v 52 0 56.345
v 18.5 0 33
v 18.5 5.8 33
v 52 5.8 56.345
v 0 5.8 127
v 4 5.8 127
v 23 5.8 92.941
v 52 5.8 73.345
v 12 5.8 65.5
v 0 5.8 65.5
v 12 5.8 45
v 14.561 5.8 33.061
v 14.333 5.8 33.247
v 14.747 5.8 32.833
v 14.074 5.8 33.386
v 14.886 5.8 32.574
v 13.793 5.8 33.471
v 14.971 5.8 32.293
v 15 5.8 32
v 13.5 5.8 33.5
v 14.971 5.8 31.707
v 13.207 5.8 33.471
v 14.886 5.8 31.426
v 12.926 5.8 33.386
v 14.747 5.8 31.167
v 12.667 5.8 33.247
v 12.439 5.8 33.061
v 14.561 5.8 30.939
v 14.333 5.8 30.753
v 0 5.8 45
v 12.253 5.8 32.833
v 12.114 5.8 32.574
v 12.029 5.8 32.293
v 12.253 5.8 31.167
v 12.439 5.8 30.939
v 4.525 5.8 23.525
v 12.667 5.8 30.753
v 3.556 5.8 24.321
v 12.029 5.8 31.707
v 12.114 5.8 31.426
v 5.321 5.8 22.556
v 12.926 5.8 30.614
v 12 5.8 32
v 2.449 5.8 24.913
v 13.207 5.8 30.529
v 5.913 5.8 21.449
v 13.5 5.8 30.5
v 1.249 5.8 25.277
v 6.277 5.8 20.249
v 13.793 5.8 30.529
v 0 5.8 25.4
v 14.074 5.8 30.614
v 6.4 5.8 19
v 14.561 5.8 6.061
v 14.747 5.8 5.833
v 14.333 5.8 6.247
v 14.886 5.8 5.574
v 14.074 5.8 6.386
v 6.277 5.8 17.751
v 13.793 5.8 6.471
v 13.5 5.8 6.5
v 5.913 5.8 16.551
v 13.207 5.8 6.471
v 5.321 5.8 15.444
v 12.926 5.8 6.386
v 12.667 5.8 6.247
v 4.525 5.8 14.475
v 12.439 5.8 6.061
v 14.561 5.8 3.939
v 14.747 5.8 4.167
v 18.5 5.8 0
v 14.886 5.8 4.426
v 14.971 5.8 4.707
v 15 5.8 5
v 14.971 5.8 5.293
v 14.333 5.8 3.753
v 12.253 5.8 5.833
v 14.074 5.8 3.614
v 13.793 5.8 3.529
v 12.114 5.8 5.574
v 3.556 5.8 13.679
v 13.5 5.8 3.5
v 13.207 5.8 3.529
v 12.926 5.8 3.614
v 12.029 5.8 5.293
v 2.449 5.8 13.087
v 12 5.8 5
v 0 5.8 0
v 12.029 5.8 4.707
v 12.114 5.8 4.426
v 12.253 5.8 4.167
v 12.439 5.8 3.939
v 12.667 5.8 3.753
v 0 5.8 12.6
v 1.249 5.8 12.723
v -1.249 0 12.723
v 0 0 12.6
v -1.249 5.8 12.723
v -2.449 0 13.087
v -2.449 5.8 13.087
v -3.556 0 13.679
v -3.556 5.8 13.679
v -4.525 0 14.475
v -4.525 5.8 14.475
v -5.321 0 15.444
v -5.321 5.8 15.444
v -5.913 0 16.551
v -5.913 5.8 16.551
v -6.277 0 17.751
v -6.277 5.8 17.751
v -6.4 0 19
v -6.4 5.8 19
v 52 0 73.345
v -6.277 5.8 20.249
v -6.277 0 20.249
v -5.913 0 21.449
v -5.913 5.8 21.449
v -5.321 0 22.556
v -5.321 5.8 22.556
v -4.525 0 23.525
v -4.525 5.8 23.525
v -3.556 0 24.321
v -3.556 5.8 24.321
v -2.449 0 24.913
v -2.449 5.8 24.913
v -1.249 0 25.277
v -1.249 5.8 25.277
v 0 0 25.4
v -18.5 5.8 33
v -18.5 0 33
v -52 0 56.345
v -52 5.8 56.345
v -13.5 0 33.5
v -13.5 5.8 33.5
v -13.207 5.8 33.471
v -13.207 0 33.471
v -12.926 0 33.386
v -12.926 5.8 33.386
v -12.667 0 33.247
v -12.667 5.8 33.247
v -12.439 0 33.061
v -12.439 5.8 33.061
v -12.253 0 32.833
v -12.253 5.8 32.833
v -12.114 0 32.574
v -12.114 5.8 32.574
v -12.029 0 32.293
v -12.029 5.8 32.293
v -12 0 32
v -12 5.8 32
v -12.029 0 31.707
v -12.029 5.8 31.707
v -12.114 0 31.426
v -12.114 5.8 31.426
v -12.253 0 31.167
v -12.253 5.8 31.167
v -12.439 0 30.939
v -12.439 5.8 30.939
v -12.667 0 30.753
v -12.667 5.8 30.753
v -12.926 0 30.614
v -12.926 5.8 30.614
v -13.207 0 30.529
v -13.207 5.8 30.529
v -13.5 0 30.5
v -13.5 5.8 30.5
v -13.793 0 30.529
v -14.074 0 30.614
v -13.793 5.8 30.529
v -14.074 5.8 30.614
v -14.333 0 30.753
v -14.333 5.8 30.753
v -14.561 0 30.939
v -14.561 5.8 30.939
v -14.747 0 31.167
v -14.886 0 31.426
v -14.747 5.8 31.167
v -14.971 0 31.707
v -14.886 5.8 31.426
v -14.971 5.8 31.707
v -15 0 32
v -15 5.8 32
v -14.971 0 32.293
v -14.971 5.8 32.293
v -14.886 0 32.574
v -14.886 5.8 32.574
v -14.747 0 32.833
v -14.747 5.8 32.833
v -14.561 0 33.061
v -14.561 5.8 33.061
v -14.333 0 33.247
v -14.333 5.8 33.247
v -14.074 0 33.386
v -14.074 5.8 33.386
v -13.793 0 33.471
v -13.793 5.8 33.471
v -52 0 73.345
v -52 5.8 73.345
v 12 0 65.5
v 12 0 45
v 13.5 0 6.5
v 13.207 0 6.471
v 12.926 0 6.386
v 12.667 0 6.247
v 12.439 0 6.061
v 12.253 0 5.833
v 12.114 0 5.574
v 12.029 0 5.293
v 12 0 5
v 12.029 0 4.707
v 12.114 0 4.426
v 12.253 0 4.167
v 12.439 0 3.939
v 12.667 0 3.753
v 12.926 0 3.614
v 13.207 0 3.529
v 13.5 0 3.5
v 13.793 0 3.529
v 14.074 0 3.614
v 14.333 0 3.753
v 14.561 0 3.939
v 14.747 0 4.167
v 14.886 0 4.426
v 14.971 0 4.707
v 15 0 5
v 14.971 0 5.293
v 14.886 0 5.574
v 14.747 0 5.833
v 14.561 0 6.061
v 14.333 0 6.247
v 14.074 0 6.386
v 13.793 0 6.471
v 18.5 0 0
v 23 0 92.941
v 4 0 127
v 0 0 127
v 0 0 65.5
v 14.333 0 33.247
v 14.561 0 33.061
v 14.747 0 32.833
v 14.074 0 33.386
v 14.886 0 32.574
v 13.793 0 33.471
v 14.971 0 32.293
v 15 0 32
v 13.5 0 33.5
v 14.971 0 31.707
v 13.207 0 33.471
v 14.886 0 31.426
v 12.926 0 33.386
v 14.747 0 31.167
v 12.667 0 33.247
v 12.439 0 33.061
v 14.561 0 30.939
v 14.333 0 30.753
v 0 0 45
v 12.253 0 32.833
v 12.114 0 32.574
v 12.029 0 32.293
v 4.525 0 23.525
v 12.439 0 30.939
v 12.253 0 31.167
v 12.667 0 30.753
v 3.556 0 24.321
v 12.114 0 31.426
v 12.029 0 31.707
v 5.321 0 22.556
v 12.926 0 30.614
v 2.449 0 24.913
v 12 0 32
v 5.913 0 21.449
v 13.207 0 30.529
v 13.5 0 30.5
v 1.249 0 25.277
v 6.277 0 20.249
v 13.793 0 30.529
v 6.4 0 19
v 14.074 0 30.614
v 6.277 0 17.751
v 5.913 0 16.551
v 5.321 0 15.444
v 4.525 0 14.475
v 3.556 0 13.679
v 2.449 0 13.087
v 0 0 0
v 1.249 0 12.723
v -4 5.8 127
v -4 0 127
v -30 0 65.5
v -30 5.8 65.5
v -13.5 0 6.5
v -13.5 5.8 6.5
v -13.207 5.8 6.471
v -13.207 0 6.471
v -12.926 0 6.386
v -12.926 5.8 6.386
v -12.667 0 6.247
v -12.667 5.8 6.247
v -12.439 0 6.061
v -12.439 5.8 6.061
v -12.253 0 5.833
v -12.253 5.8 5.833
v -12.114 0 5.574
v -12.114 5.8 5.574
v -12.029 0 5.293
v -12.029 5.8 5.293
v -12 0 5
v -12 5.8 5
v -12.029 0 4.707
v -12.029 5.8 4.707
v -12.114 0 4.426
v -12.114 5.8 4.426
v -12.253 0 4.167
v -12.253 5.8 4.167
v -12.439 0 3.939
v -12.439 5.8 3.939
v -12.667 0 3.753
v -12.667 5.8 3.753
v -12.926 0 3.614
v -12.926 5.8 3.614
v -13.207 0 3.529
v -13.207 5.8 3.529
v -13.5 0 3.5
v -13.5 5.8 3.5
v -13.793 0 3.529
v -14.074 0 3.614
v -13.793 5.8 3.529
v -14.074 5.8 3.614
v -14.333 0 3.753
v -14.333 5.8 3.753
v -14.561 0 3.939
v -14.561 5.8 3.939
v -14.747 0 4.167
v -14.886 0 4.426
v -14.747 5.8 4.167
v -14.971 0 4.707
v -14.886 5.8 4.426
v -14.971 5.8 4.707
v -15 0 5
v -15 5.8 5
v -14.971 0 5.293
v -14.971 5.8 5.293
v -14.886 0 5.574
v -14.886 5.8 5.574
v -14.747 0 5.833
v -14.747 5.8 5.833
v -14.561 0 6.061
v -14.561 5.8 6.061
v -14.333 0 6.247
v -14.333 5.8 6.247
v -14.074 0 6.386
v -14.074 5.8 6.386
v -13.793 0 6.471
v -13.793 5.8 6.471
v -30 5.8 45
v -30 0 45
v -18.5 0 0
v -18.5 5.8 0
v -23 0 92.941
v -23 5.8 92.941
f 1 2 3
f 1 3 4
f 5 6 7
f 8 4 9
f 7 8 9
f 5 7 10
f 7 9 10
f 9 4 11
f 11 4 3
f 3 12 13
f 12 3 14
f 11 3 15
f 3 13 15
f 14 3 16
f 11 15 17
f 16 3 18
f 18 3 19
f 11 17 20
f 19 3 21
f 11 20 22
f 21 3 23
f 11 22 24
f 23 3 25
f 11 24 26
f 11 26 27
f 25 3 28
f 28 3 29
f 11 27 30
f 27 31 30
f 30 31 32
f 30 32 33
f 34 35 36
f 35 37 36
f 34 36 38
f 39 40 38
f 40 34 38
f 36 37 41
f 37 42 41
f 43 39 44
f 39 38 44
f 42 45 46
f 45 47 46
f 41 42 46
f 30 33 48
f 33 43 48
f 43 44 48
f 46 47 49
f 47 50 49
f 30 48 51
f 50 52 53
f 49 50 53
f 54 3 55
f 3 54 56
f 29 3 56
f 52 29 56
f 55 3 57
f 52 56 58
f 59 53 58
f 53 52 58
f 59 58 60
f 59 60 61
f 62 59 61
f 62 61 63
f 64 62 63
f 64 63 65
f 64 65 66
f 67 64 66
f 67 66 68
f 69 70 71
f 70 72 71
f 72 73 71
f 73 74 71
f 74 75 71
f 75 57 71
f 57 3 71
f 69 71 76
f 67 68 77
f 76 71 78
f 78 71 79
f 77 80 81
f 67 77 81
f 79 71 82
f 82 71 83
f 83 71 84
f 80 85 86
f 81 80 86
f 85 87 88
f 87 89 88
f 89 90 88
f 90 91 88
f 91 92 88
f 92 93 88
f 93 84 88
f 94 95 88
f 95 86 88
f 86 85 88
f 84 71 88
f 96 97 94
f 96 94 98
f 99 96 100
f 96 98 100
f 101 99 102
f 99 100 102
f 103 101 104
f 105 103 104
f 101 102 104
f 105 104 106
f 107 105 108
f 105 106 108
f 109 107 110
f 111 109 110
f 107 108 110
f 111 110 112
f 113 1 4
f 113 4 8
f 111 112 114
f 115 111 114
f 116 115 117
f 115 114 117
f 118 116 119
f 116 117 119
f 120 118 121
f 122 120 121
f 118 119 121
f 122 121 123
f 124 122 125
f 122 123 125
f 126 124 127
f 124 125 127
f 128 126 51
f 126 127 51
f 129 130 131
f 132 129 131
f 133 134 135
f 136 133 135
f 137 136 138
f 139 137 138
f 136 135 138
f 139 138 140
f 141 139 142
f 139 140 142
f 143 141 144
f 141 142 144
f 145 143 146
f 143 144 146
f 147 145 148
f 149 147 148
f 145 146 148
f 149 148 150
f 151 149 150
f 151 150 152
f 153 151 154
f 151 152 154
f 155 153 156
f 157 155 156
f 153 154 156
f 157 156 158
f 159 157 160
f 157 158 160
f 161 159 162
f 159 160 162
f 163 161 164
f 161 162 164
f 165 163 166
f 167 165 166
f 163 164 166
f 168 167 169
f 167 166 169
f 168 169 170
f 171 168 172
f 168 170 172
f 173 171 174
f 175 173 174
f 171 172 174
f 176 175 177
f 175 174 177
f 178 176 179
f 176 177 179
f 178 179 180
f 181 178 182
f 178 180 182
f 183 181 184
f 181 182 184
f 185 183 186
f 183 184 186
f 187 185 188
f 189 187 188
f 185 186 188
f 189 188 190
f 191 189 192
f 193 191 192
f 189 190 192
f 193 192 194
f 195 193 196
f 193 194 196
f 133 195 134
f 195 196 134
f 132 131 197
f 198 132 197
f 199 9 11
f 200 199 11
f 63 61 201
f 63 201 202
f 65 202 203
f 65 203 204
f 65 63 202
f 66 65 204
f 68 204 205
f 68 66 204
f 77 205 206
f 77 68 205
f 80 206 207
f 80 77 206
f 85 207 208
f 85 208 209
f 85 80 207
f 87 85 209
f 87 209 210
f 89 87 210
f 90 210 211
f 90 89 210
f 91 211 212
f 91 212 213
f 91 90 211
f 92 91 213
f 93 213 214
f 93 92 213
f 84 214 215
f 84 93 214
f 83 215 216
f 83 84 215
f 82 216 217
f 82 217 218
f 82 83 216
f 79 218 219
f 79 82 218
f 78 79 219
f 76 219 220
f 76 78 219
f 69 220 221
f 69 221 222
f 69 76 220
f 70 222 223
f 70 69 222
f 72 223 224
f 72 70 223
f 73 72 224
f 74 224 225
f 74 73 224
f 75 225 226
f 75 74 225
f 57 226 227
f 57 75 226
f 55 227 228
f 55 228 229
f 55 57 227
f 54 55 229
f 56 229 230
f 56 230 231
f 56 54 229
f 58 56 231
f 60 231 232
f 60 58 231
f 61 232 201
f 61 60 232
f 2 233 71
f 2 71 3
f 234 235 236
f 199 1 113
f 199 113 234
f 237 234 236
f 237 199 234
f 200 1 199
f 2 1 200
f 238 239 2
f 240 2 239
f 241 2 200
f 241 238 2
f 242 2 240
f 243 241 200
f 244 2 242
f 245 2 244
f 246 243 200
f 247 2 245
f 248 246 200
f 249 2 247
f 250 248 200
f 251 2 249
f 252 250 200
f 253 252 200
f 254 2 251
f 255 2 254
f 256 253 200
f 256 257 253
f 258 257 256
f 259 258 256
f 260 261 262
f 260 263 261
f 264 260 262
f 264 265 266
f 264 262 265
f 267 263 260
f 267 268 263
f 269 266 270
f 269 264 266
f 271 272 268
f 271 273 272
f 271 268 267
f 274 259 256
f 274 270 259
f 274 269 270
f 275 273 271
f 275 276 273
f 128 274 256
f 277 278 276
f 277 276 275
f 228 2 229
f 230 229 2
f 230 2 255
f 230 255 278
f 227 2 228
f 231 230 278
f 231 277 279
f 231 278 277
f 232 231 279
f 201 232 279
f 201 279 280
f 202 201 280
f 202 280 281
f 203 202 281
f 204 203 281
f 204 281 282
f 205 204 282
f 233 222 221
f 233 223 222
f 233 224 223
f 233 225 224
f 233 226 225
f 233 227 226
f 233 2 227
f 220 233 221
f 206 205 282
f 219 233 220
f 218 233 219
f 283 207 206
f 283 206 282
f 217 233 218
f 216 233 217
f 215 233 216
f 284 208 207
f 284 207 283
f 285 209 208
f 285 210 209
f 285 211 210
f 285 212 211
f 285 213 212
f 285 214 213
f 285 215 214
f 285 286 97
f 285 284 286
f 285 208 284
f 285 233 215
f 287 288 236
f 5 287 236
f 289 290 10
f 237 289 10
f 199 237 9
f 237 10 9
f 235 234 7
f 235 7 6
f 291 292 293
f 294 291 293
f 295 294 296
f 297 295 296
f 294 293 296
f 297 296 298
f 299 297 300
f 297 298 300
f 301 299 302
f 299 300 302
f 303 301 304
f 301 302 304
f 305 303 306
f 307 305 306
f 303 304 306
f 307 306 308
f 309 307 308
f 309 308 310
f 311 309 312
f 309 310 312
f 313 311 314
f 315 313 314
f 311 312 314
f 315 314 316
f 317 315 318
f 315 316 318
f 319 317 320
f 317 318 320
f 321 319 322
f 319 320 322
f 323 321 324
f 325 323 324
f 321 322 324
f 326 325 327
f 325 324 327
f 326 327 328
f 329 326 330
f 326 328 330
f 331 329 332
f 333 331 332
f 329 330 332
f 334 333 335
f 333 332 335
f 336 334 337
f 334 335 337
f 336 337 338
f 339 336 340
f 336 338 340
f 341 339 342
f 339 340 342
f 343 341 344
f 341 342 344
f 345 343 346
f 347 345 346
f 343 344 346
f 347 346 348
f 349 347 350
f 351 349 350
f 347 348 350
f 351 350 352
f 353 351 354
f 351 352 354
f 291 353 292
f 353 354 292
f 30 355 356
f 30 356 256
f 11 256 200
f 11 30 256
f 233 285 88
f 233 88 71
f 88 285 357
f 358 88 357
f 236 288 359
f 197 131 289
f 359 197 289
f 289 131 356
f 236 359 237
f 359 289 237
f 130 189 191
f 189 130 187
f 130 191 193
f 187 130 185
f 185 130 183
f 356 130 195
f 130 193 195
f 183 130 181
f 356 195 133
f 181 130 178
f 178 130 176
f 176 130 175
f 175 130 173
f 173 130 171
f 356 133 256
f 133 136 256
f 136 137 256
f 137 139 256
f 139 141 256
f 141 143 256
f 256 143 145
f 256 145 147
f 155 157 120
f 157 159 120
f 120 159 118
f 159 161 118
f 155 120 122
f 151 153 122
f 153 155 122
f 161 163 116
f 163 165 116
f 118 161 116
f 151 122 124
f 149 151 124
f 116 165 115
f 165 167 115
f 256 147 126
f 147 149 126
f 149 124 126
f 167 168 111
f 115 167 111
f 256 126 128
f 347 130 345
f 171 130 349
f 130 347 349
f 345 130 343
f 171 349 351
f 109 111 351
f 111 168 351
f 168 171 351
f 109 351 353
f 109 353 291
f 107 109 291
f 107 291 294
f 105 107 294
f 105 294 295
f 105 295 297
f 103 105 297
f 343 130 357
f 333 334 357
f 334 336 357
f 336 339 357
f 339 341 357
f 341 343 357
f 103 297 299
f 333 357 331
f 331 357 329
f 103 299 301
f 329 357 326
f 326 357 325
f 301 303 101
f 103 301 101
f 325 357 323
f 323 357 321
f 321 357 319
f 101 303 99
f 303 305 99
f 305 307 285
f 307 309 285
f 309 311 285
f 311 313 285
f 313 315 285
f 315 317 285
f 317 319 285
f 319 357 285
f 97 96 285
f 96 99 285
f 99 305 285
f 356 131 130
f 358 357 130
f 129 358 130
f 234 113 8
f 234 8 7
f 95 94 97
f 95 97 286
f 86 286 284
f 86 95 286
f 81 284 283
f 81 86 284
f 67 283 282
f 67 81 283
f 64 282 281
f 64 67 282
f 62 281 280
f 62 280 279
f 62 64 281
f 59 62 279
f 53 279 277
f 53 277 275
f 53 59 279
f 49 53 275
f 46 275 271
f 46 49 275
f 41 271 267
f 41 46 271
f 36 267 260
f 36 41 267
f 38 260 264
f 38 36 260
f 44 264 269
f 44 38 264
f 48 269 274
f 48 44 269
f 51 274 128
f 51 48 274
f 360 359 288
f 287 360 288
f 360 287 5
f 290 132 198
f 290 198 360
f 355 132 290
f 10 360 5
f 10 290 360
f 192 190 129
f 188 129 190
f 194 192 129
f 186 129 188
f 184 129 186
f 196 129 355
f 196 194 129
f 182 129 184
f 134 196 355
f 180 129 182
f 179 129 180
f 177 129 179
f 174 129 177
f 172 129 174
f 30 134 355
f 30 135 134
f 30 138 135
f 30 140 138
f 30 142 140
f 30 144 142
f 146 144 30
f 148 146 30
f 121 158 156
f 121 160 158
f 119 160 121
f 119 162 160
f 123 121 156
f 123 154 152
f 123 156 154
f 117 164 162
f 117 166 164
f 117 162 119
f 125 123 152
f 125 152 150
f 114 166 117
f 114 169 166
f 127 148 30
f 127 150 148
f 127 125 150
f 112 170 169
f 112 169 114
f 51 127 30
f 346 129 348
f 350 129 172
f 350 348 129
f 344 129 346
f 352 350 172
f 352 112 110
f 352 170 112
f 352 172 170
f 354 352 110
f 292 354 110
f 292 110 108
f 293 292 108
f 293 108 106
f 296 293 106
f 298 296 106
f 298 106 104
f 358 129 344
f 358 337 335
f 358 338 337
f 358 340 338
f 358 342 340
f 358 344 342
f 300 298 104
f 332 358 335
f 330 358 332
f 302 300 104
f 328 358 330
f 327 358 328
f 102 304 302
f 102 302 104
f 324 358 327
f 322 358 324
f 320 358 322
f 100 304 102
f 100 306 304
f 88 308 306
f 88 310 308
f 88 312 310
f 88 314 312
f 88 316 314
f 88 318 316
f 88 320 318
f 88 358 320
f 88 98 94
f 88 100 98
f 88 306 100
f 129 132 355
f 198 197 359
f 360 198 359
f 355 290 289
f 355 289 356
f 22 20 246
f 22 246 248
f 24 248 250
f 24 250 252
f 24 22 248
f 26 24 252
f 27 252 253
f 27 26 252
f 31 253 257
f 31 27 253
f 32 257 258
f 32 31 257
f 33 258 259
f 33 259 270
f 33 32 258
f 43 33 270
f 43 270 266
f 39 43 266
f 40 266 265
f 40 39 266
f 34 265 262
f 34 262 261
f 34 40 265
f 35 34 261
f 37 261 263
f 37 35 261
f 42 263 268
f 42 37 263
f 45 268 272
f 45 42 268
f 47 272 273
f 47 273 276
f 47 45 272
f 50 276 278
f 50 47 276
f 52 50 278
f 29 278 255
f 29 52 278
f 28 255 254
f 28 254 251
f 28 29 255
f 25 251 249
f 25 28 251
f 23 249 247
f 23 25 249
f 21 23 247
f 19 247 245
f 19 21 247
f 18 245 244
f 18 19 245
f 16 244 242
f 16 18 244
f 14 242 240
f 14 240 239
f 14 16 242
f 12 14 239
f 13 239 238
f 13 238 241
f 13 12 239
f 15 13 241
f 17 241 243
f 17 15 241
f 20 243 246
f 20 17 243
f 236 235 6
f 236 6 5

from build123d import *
from build123d.topology import SkipClean

# Parameters (mm, degrees)
BOSS_EXTRU_1_DEPTH      = 5.8
ESQUISSE2_R             = 1.5
ESQUISSE2_R_2           = 6.4
ENL_V_MAT_EXTRU_1_DEPTH = 5.8
ESQUISSE3_W             = 42
ESQUISSE3_H             = 20.5
ENL_V_MAT_EXTRU_2_DEPTH = 5.8


with BuildPart() as part:
    # Esquisse1 → Boss.-Extru.1 (new body)
    with BuildSketch(Plane(origin=(0, 0, 0), x_dir=(1, 0, 0), z_dir=(0, 1, 0))):
        Polygon((0, 0), (-18.5, 0), (-18.5, -33), (-52, -56.345309326), (-52, -73.345309326), (-23, -92.941227268), (-4, -127), (0, -127), align=None)
    boss_extru_1 = extrude(amount=BOSS_EXTRU_1_DEPTH)

    # Esquisse2 → Enlèv. mat.-Extru.1 (cut)
    with BuildSketch(Plane(origin=(0, 5.8, 0), x_dir=(1, 0, 0), z_dir=(0, 1, 0))):
        with Locations(Location((-13.5, -5, 0), (0, 0, 270))):
            Circle(ESQUISSE2_R)
        with Locations((0, -19)):
            Circle(ESQUISSE2_R_2)
        with Locations(Location((-13.5, -32, 0), (0, 0, 270))):
            Circle(ESQUISSE2_R)
    enl_v_mat_extru_1 = extrude(amount=-ENL_V_MAT_EXTRU_1_DEPTH, mode=Mode.SUBTRACT)

    # Symétrie2: Boss.-Extru.1, Enlèv. mat.-Extru.1 across plane
    with SkipClean():  # the faces are left unmerged after this step: merging them gives an invalid solid
        add(boss_extru_1.mirror(Plane(origin=(0, 5.8, 0), x_dir=(0, 0, 1), z_dir=(-1, 0, 0))))
        add(enl_v_mat_extru_1.mirror(Plane(origin=(0, 5.8, 0), x_dir=(0, 0, 1), z_dir=(-1, 0, 0))), mode=Mode.SUBTRACT)

    # Esquisse3 → Enlèv. mat.-Extru.2 (cut)
    with SkipClean():  # the faces are left unmerged after this step: merging them gives an invalid solid
        with BuildSketch(Plane(origin=(0, 5.8, 0), x_dir=(1, 0, 0), z_dir=(0, 1, 0))):
            with Locations((-9, -55.25)):
                Rectangle(ESQUISSE3_W, ESQUISSE3_H)
        extrude(amount=-ENL_V_MAT_EXTRU_2_DEPTH, mode=Mode.SUBTRACT)


solid = part.part
